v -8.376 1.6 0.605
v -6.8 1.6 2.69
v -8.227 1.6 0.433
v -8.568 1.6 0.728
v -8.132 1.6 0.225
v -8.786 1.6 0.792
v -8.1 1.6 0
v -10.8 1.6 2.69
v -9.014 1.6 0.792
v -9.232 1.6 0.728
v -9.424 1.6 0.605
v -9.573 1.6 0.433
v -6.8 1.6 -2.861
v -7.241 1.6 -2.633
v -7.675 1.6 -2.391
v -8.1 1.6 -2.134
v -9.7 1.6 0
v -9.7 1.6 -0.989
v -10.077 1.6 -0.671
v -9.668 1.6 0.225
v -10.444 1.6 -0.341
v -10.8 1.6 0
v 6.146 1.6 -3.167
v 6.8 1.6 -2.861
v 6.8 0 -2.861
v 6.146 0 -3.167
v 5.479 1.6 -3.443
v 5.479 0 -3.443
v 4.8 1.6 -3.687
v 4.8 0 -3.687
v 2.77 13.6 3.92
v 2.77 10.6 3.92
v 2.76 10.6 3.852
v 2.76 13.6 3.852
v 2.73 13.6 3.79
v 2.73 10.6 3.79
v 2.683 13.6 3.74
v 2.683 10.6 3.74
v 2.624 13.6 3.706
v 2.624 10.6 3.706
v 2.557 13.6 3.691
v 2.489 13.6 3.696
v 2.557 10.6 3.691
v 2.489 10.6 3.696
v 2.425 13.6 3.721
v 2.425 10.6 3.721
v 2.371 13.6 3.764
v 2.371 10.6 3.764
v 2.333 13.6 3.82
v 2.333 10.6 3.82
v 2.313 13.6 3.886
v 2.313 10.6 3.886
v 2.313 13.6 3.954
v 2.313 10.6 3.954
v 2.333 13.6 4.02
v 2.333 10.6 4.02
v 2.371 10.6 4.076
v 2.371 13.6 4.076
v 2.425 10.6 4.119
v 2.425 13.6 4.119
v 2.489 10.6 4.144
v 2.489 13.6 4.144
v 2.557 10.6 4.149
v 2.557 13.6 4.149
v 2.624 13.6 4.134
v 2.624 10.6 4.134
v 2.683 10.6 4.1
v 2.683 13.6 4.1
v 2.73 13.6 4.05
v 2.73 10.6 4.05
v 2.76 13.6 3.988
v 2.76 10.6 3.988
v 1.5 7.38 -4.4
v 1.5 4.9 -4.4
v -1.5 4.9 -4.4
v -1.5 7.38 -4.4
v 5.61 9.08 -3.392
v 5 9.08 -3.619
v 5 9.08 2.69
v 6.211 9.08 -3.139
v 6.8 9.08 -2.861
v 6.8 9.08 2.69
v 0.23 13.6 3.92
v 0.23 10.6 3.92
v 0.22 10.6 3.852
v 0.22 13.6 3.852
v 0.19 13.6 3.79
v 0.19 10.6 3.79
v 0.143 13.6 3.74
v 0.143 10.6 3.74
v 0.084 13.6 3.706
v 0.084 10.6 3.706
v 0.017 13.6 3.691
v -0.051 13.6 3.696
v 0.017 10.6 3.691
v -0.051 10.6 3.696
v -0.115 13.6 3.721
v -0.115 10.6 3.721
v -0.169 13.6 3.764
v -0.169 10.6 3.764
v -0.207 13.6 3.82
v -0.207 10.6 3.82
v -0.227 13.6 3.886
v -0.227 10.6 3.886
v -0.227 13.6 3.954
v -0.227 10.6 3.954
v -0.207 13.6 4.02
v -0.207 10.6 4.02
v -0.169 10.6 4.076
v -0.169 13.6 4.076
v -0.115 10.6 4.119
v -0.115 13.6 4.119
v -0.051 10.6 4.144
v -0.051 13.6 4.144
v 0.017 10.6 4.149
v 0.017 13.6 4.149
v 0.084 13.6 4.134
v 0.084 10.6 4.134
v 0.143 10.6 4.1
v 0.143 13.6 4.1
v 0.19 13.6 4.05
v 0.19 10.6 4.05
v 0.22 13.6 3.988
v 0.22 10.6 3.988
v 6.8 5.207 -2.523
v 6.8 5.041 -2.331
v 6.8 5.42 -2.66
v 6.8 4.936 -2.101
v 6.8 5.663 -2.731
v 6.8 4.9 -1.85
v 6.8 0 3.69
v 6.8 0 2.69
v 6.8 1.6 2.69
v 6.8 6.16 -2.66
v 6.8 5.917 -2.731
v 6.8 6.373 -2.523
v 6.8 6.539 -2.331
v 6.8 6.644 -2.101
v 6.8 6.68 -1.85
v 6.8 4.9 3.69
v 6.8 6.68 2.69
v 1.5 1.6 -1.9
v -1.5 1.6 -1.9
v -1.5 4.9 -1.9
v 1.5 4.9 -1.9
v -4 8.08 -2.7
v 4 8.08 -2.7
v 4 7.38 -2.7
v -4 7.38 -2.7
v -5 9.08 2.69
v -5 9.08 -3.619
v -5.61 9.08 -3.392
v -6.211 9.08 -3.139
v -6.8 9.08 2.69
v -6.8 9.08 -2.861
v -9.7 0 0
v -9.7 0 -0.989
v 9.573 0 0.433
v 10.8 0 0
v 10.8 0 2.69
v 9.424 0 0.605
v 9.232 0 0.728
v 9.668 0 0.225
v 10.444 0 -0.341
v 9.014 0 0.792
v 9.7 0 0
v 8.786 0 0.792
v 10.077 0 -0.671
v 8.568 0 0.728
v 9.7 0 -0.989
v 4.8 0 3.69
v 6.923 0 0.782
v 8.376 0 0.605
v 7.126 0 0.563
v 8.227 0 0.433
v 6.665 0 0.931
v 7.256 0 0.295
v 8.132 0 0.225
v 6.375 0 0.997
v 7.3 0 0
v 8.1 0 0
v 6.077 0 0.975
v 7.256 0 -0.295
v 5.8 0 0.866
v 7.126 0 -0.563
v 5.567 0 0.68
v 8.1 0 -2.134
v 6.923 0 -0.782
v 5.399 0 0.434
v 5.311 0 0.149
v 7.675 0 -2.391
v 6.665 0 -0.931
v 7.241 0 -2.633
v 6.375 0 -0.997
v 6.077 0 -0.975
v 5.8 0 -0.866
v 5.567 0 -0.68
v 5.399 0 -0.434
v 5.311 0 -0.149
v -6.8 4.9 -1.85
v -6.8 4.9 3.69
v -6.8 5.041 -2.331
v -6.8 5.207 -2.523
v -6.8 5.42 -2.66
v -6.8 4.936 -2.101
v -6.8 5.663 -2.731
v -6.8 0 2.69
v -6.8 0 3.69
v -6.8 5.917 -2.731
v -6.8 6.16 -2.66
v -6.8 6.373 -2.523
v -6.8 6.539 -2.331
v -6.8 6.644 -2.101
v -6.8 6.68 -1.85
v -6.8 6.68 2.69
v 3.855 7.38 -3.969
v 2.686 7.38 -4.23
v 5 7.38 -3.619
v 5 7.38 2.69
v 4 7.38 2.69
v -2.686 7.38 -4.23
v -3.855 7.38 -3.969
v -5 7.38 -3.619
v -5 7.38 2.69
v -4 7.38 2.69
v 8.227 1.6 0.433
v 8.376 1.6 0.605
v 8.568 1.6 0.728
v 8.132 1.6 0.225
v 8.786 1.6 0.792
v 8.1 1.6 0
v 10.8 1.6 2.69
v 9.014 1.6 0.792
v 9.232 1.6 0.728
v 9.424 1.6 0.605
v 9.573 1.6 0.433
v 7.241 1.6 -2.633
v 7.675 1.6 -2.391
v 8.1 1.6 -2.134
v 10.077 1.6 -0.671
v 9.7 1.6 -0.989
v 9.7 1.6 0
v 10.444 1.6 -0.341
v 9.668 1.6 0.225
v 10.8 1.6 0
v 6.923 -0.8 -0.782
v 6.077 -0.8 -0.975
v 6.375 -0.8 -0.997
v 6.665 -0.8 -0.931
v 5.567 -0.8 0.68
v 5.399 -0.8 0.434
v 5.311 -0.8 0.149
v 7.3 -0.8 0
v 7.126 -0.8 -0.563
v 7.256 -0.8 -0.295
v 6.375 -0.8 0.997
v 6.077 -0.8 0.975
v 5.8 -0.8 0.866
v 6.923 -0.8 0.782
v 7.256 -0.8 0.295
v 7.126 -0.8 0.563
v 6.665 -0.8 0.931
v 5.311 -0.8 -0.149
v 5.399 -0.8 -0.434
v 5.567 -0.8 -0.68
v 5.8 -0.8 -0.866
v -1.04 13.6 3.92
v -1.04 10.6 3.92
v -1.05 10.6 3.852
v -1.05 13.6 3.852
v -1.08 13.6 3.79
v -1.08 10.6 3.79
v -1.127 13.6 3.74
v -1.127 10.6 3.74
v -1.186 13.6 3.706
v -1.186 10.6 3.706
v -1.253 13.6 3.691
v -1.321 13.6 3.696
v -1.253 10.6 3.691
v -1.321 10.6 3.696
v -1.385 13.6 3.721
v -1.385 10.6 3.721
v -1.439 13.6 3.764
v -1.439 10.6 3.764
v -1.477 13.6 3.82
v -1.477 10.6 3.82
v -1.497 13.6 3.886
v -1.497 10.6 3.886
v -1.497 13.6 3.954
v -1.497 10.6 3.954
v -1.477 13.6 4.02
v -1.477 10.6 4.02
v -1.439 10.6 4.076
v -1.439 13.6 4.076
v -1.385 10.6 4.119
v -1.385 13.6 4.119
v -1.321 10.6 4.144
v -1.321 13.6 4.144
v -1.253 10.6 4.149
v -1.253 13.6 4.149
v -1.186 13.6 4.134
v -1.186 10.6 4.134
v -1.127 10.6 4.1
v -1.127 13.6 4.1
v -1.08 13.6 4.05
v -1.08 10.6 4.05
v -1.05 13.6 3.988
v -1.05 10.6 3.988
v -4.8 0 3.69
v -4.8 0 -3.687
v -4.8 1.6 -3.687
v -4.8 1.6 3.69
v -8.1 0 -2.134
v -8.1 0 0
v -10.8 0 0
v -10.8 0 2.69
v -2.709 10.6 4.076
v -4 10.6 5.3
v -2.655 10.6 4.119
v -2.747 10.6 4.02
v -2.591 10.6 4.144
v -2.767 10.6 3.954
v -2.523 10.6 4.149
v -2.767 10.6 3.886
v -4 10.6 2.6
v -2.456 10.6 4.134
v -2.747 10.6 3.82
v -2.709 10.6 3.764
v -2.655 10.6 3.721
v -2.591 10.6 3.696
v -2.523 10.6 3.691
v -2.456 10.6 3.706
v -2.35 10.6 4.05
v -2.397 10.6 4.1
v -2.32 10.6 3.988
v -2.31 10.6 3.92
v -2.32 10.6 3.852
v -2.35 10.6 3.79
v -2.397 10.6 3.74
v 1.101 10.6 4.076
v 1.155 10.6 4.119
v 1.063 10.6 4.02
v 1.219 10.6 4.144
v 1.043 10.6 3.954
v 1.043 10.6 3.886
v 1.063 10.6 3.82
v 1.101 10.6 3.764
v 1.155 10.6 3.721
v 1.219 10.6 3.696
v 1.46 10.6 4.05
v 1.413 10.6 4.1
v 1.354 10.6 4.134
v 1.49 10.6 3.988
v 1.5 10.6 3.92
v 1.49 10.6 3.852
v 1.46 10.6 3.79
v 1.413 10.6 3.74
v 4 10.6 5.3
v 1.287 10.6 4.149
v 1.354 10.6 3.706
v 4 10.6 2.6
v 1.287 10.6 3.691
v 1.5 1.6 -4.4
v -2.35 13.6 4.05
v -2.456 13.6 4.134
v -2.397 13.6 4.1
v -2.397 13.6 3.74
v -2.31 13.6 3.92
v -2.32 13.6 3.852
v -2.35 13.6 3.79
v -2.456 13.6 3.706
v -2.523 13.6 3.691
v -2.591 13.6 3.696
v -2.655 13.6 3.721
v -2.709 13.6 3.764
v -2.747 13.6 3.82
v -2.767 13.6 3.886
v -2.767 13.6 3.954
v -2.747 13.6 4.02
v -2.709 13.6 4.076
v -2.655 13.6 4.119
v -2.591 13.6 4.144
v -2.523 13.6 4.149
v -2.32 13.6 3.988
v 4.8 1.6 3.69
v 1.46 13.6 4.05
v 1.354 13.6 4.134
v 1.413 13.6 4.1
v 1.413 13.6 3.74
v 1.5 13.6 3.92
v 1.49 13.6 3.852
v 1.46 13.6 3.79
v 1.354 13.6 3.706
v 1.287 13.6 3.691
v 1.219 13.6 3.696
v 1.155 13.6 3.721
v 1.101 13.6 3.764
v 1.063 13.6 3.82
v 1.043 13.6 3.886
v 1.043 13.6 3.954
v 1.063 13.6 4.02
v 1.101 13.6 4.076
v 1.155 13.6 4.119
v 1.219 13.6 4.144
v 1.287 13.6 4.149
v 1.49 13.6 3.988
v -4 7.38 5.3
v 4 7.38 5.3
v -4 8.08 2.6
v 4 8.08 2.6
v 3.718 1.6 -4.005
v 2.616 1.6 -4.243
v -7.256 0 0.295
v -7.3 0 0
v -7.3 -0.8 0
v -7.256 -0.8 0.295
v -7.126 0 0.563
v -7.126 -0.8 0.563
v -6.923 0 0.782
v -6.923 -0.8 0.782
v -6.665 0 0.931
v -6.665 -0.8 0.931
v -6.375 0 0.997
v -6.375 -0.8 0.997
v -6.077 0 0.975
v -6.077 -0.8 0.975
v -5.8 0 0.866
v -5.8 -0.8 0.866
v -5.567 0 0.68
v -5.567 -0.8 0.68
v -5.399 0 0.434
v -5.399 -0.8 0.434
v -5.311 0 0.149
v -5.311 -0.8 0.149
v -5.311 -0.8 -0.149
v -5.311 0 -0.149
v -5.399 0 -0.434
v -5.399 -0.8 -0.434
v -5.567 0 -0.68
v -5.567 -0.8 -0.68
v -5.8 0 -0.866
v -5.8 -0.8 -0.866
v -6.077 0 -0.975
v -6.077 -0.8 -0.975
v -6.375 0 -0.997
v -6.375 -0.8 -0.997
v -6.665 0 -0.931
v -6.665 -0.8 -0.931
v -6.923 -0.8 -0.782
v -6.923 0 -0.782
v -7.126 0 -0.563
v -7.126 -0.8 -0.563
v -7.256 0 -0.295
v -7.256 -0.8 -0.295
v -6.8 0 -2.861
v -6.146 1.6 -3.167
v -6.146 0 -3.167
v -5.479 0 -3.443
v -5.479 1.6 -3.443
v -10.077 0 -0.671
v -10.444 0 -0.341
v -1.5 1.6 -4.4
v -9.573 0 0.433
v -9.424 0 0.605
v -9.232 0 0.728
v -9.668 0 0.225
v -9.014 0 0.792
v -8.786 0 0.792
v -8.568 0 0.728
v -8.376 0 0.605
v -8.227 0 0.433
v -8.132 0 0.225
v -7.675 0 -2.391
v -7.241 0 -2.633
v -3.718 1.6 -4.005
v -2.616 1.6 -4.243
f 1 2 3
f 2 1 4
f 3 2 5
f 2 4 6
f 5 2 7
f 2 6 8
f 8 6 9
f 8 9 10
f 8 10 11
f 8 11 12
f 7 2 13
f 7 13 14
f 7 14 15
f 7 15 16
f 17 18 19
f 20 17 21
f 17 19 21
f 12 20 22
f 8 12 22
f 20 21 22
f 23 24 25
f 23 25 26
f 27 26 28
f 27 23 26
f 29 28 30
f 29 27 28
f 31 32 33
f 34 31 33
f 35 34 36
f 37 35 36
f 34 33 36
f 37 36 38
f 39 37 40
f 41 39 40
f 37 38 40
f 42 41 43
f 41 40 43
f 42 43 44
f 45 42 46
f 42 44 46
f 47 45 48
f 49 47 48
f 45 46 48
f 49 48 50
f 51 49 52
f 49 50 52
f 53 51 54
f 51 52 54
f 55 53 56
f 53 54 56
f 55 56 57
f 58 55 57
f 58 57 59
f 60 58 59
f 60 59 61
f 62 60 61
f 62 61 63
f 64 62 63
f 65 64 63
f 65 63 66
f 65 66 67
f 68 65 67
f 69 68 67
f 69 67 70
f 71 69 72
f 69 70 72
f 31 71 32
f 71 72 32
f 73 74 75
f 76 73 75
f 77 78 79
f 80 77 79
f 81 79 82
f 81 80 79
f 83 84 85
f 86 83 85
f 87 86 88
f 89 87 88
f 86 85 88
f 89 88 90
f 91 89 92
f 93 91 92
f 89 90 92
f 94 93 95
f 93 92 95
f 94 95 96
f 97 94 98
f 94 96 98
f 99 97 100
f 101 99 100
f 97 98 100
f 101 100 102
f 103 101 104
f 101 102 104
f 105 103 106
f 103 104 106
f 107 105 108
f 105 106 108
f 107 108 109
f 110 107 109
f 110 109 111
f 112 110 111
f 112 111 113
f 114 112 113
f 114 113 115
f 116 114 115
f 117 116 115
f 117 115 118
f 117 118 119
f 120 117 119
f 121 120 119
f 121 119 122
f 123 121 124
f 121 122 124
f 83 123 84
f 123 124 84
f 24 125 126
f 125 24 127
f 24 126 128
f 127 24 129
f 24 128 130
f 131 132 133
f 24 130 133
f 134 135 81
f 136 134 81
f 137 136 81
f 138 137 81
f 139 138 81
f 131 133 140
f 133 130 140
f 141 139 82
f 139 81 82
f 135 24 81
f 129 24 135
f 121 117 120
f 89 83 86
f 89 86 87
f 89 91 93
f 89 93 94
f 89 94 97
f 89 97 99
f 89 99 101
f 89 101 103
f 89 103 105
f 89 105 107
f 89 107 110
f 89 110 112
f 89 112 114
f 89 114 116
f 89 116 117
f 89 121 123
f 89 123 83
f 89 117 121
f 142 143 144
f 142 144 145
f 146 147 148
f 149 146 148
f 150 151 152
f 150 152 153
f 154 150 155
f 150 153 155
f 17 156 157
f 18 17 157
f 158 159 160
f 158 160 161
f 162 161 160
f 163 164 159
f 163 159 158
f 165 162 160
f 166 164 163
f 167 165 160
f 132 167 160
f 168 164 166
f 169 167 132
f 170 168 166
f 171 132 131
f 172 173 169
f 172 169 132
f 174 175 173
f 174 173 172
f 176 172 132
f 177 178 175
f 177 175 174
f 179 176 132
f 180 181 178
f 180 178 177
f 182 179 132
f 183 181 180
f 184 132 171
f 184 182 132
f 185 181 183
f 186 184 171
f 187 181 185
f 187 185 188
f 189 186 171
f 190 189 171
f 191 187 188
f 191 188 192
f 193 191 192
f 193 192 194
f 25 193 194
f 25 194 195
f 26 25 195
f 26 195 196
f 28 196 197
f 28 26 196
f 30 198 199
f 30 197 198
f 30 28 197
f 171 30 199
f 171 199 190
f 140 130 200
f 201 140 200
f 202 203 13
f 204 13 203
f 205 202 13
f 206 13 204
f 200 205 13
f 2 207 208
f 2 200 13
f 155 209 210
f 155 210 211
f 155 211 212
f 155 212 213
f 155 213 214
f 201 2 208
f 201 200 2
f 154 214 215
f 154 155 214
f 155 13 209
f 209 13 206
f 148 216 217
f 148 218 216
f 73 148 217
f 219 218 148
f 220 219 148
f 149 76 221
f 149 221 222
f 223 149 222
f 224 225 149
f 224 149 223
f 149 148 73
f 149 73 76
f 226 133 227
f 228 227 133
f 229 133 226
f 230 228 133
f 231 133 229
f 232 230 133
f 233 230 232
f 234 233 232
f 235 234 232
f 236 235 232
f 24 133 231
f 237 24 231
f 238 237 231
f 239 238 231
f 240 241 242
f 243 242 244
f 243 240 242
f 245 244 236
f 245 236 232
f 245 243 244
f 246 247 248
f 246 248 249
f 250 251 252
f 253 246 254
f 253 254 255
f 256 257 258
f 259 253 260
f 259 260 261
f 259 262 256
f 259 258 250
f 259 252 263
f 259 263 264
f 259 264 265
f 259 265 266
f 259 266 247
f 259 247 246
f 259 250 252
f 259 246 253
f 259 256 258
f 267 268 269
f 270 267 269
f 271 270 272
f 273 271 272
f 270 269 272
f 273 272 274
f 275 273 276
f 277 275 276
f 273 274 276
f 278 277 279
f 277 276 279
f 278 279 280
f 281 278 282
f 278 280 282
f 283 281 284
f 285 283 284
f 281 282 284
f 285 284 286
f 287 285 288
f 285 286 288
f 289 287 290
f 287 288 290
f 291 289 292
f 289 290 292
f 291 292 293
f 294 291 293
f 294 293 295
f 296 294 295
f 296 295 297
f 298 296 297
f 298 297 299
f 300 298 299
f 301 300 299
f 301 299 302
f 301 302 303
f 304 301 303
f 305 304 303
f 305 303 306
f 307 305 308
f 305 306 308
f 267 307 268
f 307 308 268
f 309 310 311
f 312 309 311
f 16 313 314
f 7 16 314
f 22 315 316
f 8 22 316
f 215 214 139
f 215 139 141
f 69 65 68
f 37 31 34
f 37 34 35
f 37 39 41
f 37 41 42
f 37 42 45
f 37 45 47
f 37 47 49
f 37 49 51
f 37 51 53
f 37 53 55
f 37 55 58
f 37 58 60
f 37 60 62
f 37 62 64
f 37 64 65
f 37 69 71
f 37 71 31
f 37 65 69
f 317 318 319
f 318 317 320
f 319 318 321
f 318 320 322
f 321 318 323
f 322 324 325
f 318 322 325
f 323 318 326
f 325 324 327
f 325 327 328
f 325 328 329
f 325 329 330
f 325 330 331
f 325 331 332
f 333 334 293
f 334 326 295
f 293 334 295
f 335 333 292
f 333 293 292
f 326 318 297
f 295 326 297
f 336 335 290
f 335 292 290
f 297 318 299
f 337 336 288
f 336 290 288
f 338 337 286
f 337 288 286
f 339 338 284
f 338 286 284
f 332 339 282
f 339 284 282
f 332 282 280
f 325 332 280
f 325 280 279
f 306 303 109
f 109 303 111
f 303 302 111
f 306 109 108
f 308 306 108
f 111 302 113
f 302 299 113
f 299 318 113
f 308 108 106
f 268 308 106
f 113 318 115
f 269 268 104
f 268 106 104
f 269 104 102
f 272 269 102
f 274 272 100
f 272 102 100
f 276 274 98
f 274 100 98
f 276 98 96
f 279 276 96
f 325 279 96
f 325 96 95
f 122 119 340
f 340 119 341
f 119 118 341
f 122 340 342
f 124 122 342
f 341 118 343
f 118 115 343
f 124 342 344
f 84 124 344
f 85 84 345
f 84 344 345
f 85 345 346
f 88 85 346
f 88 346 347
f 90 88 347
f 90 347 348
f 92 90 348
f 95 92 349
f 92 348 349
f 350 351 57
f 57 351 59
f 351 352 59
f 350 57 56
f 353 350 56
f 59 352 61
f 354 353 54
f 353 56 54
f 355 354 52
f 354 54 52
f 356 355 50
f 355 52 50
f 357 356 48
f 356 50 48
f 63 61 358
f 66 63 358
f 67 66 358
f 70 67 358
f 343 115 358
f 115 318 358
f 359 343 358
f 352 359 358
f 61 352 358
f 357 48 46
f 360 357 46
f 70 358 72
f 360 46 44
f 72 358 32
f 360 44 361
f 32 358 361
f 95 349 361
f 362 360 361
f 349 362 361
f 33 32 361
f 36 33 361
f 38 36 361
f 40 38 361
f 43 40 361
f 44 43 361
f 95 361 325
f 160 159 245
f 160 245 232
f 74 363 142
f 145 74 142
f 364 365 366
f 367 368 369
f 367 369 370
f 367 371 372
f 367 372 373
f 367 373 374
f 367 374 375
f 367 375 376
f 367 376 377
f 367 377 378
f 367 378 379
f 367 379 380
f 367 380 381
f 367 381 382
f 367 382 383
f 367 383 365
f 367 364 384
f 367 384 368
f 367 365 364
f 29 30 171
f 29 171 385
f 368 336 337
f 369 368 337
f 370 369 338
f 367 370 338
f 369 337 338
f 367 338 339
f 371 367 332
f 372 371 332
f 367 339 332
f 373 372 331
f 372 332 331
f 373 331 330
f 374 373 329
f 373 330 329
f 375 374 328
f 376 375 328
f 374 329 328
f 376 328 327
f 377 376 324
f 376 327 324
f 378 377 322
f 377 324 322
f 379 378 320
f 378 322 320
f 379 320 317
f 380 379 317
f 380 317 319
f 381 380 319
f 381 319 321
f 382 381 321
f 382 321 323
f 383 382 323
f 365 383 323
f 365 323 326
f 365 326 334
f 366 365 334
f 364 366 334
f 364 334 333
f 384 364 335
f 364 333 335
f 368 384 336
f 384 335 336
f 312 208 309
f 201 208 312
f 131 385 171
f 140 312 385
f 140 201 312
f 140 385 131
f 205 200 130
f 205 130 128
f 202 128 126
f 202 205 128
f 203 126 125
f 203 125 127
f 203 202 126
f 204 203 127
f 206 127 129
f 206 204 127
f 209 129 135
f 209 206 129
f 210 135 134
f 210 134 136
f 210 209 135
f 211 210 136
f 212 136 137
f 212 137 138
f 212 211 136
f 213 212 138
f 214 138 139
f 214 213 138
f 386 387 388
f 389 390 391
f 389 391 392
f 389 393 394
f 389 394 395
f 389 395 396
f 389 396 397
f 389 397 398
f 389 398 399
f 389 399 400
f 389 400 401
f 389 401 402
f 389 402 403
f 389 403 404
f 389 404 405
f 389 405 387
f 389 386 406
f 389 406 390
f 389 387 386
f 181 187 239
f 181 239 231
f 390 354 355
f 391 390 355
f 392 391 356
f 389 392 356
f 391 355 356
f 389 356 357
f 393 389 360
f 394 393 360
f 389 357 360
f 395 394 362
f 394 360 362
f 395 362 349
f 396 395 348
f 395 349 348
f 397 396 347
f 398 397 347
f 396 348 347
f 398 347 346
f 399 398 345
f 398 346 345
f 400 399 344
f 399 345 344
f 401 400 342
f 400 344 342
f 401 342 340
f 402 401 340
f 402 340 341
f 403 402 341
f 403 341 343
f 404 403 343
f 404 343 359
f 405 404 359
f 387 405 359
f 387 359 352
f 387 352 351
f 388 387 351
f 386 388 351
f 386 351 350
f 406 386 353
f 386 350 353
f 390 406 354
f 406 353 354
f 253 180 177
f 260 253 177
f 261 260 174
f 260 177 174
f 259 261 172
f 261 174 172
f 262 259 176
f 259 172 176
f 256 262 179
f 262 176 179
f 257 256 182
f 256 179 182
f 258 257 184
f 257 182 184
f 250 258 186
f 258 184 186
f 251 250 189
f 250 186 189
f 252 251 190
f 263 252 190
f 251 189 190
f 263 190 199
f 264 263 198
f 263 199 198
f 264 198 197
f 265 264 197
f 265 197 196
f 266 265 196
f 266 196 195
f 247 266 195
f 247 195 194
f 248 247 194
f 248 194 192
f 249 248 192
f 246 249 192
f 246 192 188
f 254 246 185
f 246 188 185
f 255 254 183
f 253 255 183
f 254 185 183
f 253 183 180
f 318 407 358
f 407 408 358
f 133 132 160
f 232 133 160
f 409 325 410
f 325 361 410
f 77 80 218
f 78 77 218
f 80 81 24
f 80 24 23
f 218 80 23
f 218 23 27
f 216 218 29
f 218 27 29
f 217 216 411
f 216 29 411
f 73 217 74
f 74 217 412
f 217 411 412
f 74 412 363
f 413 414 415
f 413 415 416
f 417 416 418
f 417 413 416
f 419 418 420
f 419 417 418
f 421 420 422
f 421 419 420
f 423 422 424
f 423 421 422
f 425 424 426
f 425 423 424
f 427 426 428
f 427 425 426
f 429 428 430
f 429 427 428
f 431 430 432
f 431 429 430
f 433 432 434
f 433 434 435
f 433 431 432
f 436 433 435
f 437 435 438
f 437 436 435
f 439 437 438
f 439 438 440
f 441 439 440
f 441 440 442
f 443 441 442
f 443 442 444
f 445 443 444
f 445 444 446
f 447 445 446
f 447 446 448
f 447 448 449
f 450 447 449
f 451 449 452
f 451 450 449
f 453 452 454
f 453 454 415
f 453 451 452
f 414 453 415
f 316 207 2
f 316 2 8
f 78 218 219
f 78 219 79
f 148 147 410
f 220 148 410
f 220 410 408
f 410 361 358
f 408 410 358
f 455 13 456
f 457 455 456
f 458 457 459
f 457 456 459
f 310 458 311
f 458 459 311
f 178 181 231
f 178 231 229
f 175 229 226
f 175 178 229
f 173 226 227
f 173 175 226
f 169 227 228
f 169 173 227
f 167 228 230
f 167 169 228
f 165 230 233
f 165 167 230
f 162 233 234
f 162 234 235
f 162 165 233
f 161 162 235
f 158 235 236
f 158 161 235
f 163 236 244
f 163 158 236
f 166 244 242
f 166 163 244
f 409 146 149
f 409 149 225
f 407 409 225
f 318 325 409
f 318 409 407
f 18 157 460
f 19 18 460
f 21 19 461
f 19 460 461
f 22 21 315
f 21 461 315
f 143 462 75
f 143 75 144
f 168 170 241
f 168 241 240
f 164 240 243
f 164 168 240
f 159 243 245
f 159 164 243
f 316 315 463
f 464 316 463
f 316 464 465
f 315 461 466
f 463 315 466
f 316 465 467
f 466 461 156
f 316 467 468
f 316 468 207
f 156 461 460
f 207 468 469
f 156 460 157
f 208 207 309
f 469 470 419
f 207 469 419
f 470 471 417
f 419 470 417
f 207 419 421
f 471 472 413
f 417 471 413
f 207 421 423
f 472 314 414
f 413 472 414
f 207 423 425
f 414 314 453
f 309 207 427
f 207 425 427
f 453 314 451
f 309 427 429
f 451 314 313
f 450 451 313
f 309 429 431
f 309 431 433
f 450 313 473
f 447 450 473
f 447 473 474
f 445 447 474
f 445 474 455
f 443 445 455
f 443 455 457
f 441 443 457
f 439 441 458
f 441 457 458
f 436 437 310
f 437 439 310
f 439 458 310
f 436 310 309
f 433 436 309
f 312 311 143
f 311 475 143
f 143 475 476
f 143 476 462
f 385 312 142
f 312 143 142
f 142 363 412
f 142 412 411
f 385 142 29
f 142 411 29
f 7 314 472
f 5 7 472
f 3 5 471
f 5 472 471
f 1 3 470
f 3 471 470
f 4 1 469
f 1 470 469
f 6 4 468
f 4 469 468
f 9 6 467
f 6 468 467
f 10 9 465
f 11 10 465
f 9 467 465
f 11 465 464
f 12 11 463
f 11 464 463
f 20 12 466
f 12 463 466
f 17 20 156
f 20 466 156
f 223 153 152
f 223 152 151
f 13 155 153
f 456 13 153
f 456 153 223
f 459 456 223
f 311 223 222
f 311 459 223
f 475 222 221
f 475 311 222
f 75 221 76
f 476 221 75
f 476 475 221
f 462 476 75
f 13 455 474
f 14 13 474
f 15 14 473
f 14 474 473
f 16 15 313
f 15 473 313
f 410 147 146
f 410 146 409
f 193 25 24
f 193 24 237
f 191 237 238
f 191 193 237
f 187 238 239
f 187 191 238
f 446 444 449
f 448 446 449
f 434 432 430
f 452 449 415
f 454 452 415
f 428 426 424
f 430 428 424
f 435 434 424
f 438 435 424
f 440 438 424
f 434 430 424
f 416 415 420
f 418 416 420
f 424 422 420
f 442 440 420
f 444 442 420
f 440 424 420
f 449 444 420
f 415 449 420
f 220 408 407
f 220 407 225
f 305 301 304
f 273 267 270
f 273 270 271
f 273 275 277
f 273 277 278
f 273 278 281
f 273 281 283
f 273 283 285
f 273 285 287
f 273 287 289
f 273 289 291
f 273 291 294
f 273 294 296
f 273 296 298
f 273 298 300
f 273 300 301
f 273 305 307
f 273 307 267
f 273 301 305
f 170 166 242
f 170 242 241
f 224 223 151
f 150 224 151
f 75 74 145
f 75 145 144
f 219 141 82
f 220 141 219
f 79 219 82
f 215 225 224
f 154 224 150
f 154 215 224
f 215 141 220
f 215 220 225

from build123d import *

# Parameters (mm, degrees)
BOSS_EXTRUDE1_DEPTH = 1.6
BOSS_EXTRUDE2_DEPTH = 1.6
BOSS_EXTRUDE3_DEPTH = 3.3
BOSS_EXTRUDE4_DEPTH = 1
BOSS_EXTRUDE5_DEPTH = 6.8
SKETCH7_W           = 1.5
SKETCH7_H           = 1.538953592
BOSS_EXTRUDE6_DEPTH = 4.18
SKETCH8_R           = 1
BOSS_EXTRUDE7_DEPTH = 0.8
SKETCH9_W           = 5
SKETCH9_H           = 1.7
CUT_EXTRUDE1_DEPTH  = 8.09
BOSS_EXTRUDE8_DEPTH = 4
SKETCH12_R          = 0.23
BOSS_EXTRUDE9_DEPTH = 3


with BuildPart() as part:
    # Sketch1 → Boss-Extrude1 (new body)
    with BuildSketch(Plane(origin=(0, 0, 0), x_dir=(1, 0, 0), z_dir=(0, 1, 0))):
        with BuildLine():
            Line((9.7, 0), (9.7, 0.989309127))
            ThreePointArc((9.7, 0.989309127), (10.261810116, 0.507786079), (10.8, 0))
            Line((10.8, 0), (10.8, -2.69))
            Line((10.8, -2.69), (6.8, -2.69))
            Line((6.8, -2.69), (6.8, 2.861046408))
            ThreePointArc((6.8, 2.861046408), (7.458731009, 2.513392708), (8.1, 2.134494679))
            Line((8.1, 2.134494679), (8.1, 0))
            ThreePointArc((8.1, 0), (8.9, -0.8), (9.7, 0))
        make_face()
    extrude(amount=BOSS_EXTRUDE1_DEPTH)

    # Sketch2 → Boss-Extrude2 (add)
    with BuildSketch(Plane(origin=(0, 1.6, 0), x_dir=(1, 0, 0), z_dir=(0, 1, 0))):
        with BuildLine():
            Line((6.8, -2.69), (6.8, 2.861046408))
            ThreePointArc((6.8, 2.861046408), (5.814434387, 3.309058403), (4.8, 3.687181666))
            Line((4.8, 3.687181666), (4.8, -2.69))
            Line((4.8, -2.69), (6.8, -2.69))
        make_face()
    extrude(amount=-BOSS_EXTRUDE2_DEPTH)

    # Sketch3 → Boss-Extrude3 (add)
    with BuildSketch(Plane(origin=(0, 1.6, 0), x_dir=(1, 0, 0), z_dir=(0, 1, 0))):
        with BuildLine():
            Line((6.8, -2.69), (6.8, 2.861046408))
            ThreePointArc((6.8, 2.861046408), (4.219046242, 3.868311453), (1.5, 4.4))
            Line((1.5, 4.4), (1.5, 1.9))
            Line((1.5, 1.9), (0, 1.9))
            Line((0, 1.9), (0, -2.69))
            Line((0, -2.69), (6.8, -2.69))
        make_face()
    extrude(amount=BOSS_EXTRUDE3_DEPTH)

    # Sketch4 → Boss-Extrude4 (add)
    with BuildSketch(Plane.XY.offset(2.69)):
        Polygon((6.8, 1.6), (6.8, 0), (4.8, 0), (4.8, 1.6), (0, 1.6), (0, 4.9), (6.8, 4.9), align=None)
    extrude(amount=BOSS_EXTRUDE4_DEPTH)

    # Sketch6 → Boss-Extrude5 (add)
    with BuildSketch(Plane(origin=(6.8, 0, 0), x_dir=(0, 0, -1), z_dir=(1, 0, 0))):
        with BuildLine():
            Line((-2.69, 9.08), (2.861046408, 9.08))
            Line((2.861046408, 9.08), (2.861046408, 4.9))
            Line((2.861046408, 4.9), (1.85, 4.9))
            ThreePointArc((1.85, 4.9), (2.74, 5.79), (1.85, 6.68))
            Line((1.85, 6.68), (-2.69, 6.68))
            Line((-2.69, 6.68), (-2.69, 9.08))
        make_face()
    extrude(amount=-BOSS_EXTRUDE5_DEPTH)

    # Sketch7 → Boss-Extrude6 (add)
    with BuildSketch(Plane(origin=(0, 4.9, 0), x_dir=(1, 0, 0), z_dir=(0, 1, 0))):
        with Locations((0.75, 3.630523204)):
            Rectangle(SKETCH7_W, SKETCH7_H)
        with BuildLine():
            Line((1.5, 4.4), (1.5, 2.861046408))
            Line((1.5, 2.861046408), (6.8, 2.861046408))
            ThreePointArc((6.8, 2.861046408), (4.219046242, 3.868311453), (1.5, 4.4))
        make_face()
    extrude(amount=BOSS_EXTRUDE6_DEPTH)

    # Sketch8 → Boss-Extrude7 (add)
    with BuildSketch(Plane.XZ):
        with Locations((6.3, 0)):
            Circle(SKETCH8_R)
    extrude(amount=BOSS_EXTRUDE7_DEPTH)

    # Sketch9 → Cut-Extrude1 (cut, through all)
    with BuildSketch(Plane.XY.offset(2.69)):
        with Locations((2.5, 8.23)):
            Rectangle(SKETCH9_W, SKETCH9_H)
    extrude(amount=-CUT_EXTRUDE1_DEPTH, mode=Mode.SUBTRACT)

    # Mirror3: part across plane


with BuildPart() as part_1:
    add(part.part)
    add(part.part.mirror(Plane(origin=(0, 4.9, -1.9), x_dir=(0, 0, 1), z_dir=(1, 0, 0))))

    # Sketch10 → Boss-Extrude8 (add, symmetric)
    with BuildSketch(Plane(origin=(0, 0, 0), x_dir=(0, 0, -1), z_dir=(1, 0, 0))):
        Polygon((0, 7.38), (-5.3, 7.38), (-5.3, 10.6), (-2.6, 10.6), (-2.6, 8.08), (0, 8.08), (2.7, 8.08), (2.7, 7.38), align=None)
    extrude(amount=BOSS_EXTRUDE8_DEPTH, both=True)

    # Sketch12 → Boss-Extrude9 (add)
    with BuildSketch(Plane(origin=(0, 10.6, 0), x_dir=(1, 0, 0), z_dir=(0, 1, 0))):
        with Locations((0, -3.92)):
            Circle(SKETCH12_R)
        with Locations((1.27, -3.92)):
            Circle(SKETCH12_R)
        with Locations((2.54, -3.92)):
            Circle(SKETCH12_R)
        with Locations((-1.27, -3.92)):
            Circle(SKETCH12_R)
        with Locations((-2.54, -3.92)):
            Circle(SKETCH12_R)
    extrude(amount=BOSS_EXTRUDE9_DEPTH)


solid = part_1.part
